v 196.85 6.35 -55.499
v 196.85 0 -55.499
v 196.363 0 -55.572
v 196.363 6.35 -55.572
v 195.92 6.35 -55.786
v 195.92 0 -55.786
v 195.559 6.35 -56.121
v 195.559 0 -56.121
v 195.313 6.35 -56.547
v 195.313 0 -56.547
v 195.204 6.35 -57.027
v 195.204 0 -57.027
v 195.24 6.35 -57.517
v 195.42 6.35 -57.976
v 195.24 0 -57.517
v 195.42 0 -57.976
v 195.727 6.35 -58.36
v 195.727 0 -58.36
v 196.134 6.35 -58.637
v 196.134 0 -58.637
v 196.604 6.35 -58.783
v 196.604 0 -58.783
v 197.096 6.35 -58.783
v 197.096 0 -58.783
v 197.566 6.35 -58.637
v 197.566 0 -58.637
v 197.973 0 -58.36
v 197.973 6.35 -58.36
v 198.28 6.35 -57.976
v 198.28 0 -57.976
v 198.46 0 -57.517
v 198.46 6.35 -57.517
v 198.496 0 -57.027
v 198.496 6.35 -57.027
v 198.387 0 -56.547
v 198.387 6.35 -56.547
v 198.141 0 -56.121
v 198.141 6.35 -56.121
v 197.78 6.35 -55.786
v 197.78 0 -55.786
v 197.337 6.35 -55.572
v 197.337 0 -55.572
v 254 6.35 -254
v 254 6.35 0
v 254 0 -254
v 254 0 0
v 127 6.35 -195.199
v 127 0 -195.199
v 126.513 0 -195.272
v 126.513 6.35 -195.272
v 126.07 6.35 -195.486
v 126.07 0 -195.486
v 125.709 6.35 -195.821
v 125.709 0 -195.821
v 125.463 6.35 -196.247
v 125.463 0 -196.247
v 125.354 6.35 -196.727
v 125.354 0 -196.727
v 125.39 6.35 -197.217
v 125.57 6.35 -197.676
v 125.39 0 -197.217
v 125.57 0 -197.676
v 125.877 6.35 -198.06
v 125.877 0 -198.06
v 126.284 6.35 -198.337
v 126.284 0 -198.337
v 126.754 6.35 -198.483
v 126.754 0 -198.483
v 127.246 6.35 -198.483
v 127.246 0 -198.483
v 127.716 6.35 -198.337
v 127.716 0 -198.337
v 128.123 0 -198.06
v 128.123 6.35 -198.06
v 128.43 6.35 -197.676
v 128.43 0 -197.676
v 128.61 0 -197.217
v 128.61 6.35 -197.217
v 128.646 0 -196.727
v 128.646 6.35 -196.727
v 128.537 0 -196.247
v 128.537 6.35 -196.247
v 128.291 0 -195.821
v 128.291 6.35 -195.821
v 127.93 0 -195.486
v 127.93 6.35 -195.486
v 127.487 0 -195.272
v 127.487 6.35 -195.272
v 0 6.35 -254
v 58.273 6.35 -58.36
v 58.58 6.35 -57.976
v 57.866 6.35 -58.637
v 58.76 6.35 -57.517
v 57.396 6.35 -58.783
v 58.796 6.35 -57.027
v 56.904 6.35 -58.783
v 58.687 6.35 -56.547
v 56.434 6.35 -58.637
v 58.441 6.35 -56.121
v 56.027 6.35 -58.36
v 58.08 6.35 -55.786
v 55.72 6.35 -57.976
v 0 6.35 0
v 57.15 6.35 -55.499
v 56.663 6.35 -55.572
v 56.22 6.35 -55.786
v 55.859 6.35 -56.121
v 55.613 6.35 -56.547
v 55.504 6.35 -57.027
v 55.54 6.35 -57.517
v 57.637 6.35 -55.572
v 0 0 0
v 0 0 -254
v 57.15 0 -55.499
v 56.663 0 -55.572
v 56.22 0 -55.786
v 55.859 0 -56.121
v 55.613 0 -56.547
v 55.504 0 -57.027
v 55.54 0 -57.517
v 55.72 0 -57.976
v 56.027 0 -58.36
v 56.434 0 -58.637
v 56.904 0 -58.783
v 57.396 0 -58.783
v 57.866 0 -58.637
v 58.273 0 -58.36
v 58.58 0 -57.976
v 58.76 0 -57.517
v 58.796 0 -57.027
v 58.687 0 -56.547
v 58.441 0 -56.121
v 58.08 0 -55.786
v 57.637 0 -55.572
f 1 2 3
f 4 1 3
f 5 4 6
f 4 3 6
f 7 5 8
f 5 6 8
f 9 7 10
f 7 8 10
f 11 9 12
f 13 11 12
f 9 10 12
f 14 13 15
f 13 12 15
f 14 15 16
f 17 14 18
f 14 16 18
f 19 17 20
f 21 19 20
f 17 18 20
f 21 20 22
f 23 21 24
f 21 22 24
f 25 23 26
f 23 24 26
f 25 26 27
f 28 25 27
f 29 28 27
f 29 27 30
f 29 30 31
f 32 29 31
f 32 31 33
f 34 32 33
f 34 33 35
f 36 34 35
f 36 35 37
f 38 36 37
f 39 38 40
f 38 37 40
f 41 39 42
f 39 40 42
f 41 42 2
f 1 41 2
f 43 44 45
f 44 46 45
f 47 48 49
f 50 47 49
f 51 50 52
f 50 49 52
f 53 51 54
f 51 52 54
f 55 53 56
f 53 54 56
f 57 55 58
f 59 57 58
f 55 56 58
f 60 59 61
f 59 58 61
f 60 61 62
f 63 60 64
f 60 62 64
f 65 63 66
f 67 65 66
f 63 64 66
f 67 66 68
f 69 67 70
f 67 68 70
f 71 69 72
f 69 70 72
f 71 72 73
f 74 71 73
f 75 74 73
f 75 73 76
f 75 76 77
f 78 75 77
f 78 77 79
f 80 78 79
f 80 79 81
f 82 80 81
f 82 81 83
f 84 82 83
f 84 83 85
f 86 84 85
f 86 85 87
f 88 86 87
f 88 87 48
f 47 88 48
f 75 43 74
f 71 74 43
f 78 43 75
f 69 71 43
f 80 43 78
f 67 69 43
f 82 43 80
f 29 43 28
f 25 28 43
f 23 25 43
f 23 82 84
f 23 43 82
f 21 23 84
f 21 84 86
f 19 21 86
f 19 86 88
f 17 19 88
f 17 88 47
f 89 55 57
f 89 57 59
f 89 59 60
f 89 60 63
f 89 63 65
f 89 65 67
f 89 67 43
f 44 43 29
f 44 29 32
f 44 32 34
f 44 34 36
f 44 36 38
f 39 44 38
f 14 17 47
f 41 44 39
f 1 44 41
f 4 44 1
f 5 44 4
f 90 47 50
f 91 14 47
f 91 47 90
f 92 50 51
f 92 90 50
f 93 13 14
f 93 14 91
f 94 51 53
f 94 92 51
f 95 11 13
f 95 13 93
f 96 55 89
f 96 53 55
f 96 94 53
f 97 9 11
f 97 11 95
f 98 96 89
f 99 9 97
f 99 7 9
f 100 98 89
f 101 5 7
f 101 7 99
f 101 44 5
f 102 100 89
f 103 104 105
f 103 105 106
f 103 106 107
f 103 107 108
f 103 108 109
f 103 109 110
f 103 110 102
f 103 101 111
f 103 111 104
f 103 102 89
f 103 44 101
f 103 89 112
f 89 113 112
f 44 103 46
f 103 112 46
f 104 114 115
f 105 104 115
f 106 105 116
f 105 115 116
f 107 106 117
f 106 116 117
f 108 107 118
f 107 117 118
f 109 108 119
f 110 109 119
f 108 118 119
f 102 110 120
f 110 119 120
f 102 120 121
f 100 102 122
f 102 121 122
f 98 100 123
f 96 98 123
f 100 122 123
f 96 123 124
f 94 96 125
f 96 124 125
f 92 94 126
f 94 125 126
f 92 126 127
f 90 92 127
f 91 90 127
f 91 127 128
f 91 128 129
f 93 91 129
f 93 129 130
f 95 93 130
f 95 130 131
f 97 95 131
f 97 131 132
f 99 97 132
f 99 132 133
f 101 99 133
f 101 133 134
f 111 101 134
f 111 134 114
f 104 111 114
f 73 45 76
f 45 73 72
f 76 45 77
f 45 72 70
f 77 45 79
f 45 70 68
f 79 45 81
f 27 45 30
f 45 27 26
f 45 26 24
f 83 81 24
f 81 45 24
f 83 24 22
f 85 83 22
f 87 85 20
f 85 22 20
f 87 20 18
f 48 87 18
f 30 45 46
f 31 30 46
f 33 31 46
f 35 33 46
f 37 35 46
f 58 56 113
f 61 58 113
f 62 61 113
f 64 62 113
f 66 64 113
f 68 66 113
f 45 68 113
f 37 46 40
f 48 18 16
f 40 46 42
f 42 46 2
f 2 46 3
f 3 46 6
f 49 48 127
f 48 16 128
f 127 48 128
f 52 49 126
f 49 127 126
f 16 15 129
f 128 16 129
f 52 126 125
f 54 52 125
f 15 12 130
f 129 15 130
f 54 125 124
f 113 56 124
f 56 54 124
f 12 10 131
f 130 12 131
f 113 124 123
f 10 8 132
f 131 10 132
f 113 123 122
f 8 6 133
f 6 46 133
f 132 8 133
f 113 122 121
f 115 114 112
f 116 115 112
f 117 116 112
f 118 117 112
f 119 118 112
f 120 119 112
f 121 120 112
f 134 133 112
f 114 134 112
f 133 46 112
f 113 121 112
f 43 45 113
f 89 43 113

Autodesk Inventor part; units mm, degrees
ref_plane "YZ Plane" through (0, 0, 0) normal (1, 0, 0) x (0, 1, 0)
ref_plane "XZ Plane" through (0, 0, 0) normal (0, 1, 0) x (-1, 0, 0)
ref_plane "XY Plane" through (0, 0, 0) normal (0, 0, 1) x (1, 0, 0)
sketch "Sketch1" plane through (0, 0, 0) normal (0, 1, 0) x (-1, 0, 0)
  line L0 (0, 0) -> (-254, 0)
  line L1 (-254, 0) -> (-254, -254)
  line L2 (-254, -254) -> (0, -254)
  line L3 (0, -254) -> (0, 0)
  dimension "d0" = 254
  dimension "d1" = 254
extrude "Extrusion1" add sketch "Sketch1" along normal blind 6.35
sketch "Sketch2" plane through (0, 6.35, 0) normal (0, 1, 0) x (1, 0, 0)
  line L0 (254, 254) -> (0, 254) projected
  line L1 (127, 196.85) -> (127, 57.15)
  line L2 (127, 57.15) -> (57.15, 57.15)
  line L3 (57.15, 57.15) -> (196.85, 57.15)
  line L4 (0, 254) -> (0, 0) projected
  point P0 (127, 254)
  point P1 (127, 127)
  point P2 (0, 127)
  dimension "d4" = 69.85
  dimension "d5" = 69.85
  dimension "d6" = 139.7
hole "Hole1" at (57.15, 6.35, -57.15) at (196.85, 6.35, -57.15) at (127, 6.35, -196.85) direction (0, -1, 0) diameter 3.302 end through all thread size "8-32 UNC" class "2B" standard "ANSI Unified Screw Threads"
equation "\"d5\" = d4"
properties part number "Base"
